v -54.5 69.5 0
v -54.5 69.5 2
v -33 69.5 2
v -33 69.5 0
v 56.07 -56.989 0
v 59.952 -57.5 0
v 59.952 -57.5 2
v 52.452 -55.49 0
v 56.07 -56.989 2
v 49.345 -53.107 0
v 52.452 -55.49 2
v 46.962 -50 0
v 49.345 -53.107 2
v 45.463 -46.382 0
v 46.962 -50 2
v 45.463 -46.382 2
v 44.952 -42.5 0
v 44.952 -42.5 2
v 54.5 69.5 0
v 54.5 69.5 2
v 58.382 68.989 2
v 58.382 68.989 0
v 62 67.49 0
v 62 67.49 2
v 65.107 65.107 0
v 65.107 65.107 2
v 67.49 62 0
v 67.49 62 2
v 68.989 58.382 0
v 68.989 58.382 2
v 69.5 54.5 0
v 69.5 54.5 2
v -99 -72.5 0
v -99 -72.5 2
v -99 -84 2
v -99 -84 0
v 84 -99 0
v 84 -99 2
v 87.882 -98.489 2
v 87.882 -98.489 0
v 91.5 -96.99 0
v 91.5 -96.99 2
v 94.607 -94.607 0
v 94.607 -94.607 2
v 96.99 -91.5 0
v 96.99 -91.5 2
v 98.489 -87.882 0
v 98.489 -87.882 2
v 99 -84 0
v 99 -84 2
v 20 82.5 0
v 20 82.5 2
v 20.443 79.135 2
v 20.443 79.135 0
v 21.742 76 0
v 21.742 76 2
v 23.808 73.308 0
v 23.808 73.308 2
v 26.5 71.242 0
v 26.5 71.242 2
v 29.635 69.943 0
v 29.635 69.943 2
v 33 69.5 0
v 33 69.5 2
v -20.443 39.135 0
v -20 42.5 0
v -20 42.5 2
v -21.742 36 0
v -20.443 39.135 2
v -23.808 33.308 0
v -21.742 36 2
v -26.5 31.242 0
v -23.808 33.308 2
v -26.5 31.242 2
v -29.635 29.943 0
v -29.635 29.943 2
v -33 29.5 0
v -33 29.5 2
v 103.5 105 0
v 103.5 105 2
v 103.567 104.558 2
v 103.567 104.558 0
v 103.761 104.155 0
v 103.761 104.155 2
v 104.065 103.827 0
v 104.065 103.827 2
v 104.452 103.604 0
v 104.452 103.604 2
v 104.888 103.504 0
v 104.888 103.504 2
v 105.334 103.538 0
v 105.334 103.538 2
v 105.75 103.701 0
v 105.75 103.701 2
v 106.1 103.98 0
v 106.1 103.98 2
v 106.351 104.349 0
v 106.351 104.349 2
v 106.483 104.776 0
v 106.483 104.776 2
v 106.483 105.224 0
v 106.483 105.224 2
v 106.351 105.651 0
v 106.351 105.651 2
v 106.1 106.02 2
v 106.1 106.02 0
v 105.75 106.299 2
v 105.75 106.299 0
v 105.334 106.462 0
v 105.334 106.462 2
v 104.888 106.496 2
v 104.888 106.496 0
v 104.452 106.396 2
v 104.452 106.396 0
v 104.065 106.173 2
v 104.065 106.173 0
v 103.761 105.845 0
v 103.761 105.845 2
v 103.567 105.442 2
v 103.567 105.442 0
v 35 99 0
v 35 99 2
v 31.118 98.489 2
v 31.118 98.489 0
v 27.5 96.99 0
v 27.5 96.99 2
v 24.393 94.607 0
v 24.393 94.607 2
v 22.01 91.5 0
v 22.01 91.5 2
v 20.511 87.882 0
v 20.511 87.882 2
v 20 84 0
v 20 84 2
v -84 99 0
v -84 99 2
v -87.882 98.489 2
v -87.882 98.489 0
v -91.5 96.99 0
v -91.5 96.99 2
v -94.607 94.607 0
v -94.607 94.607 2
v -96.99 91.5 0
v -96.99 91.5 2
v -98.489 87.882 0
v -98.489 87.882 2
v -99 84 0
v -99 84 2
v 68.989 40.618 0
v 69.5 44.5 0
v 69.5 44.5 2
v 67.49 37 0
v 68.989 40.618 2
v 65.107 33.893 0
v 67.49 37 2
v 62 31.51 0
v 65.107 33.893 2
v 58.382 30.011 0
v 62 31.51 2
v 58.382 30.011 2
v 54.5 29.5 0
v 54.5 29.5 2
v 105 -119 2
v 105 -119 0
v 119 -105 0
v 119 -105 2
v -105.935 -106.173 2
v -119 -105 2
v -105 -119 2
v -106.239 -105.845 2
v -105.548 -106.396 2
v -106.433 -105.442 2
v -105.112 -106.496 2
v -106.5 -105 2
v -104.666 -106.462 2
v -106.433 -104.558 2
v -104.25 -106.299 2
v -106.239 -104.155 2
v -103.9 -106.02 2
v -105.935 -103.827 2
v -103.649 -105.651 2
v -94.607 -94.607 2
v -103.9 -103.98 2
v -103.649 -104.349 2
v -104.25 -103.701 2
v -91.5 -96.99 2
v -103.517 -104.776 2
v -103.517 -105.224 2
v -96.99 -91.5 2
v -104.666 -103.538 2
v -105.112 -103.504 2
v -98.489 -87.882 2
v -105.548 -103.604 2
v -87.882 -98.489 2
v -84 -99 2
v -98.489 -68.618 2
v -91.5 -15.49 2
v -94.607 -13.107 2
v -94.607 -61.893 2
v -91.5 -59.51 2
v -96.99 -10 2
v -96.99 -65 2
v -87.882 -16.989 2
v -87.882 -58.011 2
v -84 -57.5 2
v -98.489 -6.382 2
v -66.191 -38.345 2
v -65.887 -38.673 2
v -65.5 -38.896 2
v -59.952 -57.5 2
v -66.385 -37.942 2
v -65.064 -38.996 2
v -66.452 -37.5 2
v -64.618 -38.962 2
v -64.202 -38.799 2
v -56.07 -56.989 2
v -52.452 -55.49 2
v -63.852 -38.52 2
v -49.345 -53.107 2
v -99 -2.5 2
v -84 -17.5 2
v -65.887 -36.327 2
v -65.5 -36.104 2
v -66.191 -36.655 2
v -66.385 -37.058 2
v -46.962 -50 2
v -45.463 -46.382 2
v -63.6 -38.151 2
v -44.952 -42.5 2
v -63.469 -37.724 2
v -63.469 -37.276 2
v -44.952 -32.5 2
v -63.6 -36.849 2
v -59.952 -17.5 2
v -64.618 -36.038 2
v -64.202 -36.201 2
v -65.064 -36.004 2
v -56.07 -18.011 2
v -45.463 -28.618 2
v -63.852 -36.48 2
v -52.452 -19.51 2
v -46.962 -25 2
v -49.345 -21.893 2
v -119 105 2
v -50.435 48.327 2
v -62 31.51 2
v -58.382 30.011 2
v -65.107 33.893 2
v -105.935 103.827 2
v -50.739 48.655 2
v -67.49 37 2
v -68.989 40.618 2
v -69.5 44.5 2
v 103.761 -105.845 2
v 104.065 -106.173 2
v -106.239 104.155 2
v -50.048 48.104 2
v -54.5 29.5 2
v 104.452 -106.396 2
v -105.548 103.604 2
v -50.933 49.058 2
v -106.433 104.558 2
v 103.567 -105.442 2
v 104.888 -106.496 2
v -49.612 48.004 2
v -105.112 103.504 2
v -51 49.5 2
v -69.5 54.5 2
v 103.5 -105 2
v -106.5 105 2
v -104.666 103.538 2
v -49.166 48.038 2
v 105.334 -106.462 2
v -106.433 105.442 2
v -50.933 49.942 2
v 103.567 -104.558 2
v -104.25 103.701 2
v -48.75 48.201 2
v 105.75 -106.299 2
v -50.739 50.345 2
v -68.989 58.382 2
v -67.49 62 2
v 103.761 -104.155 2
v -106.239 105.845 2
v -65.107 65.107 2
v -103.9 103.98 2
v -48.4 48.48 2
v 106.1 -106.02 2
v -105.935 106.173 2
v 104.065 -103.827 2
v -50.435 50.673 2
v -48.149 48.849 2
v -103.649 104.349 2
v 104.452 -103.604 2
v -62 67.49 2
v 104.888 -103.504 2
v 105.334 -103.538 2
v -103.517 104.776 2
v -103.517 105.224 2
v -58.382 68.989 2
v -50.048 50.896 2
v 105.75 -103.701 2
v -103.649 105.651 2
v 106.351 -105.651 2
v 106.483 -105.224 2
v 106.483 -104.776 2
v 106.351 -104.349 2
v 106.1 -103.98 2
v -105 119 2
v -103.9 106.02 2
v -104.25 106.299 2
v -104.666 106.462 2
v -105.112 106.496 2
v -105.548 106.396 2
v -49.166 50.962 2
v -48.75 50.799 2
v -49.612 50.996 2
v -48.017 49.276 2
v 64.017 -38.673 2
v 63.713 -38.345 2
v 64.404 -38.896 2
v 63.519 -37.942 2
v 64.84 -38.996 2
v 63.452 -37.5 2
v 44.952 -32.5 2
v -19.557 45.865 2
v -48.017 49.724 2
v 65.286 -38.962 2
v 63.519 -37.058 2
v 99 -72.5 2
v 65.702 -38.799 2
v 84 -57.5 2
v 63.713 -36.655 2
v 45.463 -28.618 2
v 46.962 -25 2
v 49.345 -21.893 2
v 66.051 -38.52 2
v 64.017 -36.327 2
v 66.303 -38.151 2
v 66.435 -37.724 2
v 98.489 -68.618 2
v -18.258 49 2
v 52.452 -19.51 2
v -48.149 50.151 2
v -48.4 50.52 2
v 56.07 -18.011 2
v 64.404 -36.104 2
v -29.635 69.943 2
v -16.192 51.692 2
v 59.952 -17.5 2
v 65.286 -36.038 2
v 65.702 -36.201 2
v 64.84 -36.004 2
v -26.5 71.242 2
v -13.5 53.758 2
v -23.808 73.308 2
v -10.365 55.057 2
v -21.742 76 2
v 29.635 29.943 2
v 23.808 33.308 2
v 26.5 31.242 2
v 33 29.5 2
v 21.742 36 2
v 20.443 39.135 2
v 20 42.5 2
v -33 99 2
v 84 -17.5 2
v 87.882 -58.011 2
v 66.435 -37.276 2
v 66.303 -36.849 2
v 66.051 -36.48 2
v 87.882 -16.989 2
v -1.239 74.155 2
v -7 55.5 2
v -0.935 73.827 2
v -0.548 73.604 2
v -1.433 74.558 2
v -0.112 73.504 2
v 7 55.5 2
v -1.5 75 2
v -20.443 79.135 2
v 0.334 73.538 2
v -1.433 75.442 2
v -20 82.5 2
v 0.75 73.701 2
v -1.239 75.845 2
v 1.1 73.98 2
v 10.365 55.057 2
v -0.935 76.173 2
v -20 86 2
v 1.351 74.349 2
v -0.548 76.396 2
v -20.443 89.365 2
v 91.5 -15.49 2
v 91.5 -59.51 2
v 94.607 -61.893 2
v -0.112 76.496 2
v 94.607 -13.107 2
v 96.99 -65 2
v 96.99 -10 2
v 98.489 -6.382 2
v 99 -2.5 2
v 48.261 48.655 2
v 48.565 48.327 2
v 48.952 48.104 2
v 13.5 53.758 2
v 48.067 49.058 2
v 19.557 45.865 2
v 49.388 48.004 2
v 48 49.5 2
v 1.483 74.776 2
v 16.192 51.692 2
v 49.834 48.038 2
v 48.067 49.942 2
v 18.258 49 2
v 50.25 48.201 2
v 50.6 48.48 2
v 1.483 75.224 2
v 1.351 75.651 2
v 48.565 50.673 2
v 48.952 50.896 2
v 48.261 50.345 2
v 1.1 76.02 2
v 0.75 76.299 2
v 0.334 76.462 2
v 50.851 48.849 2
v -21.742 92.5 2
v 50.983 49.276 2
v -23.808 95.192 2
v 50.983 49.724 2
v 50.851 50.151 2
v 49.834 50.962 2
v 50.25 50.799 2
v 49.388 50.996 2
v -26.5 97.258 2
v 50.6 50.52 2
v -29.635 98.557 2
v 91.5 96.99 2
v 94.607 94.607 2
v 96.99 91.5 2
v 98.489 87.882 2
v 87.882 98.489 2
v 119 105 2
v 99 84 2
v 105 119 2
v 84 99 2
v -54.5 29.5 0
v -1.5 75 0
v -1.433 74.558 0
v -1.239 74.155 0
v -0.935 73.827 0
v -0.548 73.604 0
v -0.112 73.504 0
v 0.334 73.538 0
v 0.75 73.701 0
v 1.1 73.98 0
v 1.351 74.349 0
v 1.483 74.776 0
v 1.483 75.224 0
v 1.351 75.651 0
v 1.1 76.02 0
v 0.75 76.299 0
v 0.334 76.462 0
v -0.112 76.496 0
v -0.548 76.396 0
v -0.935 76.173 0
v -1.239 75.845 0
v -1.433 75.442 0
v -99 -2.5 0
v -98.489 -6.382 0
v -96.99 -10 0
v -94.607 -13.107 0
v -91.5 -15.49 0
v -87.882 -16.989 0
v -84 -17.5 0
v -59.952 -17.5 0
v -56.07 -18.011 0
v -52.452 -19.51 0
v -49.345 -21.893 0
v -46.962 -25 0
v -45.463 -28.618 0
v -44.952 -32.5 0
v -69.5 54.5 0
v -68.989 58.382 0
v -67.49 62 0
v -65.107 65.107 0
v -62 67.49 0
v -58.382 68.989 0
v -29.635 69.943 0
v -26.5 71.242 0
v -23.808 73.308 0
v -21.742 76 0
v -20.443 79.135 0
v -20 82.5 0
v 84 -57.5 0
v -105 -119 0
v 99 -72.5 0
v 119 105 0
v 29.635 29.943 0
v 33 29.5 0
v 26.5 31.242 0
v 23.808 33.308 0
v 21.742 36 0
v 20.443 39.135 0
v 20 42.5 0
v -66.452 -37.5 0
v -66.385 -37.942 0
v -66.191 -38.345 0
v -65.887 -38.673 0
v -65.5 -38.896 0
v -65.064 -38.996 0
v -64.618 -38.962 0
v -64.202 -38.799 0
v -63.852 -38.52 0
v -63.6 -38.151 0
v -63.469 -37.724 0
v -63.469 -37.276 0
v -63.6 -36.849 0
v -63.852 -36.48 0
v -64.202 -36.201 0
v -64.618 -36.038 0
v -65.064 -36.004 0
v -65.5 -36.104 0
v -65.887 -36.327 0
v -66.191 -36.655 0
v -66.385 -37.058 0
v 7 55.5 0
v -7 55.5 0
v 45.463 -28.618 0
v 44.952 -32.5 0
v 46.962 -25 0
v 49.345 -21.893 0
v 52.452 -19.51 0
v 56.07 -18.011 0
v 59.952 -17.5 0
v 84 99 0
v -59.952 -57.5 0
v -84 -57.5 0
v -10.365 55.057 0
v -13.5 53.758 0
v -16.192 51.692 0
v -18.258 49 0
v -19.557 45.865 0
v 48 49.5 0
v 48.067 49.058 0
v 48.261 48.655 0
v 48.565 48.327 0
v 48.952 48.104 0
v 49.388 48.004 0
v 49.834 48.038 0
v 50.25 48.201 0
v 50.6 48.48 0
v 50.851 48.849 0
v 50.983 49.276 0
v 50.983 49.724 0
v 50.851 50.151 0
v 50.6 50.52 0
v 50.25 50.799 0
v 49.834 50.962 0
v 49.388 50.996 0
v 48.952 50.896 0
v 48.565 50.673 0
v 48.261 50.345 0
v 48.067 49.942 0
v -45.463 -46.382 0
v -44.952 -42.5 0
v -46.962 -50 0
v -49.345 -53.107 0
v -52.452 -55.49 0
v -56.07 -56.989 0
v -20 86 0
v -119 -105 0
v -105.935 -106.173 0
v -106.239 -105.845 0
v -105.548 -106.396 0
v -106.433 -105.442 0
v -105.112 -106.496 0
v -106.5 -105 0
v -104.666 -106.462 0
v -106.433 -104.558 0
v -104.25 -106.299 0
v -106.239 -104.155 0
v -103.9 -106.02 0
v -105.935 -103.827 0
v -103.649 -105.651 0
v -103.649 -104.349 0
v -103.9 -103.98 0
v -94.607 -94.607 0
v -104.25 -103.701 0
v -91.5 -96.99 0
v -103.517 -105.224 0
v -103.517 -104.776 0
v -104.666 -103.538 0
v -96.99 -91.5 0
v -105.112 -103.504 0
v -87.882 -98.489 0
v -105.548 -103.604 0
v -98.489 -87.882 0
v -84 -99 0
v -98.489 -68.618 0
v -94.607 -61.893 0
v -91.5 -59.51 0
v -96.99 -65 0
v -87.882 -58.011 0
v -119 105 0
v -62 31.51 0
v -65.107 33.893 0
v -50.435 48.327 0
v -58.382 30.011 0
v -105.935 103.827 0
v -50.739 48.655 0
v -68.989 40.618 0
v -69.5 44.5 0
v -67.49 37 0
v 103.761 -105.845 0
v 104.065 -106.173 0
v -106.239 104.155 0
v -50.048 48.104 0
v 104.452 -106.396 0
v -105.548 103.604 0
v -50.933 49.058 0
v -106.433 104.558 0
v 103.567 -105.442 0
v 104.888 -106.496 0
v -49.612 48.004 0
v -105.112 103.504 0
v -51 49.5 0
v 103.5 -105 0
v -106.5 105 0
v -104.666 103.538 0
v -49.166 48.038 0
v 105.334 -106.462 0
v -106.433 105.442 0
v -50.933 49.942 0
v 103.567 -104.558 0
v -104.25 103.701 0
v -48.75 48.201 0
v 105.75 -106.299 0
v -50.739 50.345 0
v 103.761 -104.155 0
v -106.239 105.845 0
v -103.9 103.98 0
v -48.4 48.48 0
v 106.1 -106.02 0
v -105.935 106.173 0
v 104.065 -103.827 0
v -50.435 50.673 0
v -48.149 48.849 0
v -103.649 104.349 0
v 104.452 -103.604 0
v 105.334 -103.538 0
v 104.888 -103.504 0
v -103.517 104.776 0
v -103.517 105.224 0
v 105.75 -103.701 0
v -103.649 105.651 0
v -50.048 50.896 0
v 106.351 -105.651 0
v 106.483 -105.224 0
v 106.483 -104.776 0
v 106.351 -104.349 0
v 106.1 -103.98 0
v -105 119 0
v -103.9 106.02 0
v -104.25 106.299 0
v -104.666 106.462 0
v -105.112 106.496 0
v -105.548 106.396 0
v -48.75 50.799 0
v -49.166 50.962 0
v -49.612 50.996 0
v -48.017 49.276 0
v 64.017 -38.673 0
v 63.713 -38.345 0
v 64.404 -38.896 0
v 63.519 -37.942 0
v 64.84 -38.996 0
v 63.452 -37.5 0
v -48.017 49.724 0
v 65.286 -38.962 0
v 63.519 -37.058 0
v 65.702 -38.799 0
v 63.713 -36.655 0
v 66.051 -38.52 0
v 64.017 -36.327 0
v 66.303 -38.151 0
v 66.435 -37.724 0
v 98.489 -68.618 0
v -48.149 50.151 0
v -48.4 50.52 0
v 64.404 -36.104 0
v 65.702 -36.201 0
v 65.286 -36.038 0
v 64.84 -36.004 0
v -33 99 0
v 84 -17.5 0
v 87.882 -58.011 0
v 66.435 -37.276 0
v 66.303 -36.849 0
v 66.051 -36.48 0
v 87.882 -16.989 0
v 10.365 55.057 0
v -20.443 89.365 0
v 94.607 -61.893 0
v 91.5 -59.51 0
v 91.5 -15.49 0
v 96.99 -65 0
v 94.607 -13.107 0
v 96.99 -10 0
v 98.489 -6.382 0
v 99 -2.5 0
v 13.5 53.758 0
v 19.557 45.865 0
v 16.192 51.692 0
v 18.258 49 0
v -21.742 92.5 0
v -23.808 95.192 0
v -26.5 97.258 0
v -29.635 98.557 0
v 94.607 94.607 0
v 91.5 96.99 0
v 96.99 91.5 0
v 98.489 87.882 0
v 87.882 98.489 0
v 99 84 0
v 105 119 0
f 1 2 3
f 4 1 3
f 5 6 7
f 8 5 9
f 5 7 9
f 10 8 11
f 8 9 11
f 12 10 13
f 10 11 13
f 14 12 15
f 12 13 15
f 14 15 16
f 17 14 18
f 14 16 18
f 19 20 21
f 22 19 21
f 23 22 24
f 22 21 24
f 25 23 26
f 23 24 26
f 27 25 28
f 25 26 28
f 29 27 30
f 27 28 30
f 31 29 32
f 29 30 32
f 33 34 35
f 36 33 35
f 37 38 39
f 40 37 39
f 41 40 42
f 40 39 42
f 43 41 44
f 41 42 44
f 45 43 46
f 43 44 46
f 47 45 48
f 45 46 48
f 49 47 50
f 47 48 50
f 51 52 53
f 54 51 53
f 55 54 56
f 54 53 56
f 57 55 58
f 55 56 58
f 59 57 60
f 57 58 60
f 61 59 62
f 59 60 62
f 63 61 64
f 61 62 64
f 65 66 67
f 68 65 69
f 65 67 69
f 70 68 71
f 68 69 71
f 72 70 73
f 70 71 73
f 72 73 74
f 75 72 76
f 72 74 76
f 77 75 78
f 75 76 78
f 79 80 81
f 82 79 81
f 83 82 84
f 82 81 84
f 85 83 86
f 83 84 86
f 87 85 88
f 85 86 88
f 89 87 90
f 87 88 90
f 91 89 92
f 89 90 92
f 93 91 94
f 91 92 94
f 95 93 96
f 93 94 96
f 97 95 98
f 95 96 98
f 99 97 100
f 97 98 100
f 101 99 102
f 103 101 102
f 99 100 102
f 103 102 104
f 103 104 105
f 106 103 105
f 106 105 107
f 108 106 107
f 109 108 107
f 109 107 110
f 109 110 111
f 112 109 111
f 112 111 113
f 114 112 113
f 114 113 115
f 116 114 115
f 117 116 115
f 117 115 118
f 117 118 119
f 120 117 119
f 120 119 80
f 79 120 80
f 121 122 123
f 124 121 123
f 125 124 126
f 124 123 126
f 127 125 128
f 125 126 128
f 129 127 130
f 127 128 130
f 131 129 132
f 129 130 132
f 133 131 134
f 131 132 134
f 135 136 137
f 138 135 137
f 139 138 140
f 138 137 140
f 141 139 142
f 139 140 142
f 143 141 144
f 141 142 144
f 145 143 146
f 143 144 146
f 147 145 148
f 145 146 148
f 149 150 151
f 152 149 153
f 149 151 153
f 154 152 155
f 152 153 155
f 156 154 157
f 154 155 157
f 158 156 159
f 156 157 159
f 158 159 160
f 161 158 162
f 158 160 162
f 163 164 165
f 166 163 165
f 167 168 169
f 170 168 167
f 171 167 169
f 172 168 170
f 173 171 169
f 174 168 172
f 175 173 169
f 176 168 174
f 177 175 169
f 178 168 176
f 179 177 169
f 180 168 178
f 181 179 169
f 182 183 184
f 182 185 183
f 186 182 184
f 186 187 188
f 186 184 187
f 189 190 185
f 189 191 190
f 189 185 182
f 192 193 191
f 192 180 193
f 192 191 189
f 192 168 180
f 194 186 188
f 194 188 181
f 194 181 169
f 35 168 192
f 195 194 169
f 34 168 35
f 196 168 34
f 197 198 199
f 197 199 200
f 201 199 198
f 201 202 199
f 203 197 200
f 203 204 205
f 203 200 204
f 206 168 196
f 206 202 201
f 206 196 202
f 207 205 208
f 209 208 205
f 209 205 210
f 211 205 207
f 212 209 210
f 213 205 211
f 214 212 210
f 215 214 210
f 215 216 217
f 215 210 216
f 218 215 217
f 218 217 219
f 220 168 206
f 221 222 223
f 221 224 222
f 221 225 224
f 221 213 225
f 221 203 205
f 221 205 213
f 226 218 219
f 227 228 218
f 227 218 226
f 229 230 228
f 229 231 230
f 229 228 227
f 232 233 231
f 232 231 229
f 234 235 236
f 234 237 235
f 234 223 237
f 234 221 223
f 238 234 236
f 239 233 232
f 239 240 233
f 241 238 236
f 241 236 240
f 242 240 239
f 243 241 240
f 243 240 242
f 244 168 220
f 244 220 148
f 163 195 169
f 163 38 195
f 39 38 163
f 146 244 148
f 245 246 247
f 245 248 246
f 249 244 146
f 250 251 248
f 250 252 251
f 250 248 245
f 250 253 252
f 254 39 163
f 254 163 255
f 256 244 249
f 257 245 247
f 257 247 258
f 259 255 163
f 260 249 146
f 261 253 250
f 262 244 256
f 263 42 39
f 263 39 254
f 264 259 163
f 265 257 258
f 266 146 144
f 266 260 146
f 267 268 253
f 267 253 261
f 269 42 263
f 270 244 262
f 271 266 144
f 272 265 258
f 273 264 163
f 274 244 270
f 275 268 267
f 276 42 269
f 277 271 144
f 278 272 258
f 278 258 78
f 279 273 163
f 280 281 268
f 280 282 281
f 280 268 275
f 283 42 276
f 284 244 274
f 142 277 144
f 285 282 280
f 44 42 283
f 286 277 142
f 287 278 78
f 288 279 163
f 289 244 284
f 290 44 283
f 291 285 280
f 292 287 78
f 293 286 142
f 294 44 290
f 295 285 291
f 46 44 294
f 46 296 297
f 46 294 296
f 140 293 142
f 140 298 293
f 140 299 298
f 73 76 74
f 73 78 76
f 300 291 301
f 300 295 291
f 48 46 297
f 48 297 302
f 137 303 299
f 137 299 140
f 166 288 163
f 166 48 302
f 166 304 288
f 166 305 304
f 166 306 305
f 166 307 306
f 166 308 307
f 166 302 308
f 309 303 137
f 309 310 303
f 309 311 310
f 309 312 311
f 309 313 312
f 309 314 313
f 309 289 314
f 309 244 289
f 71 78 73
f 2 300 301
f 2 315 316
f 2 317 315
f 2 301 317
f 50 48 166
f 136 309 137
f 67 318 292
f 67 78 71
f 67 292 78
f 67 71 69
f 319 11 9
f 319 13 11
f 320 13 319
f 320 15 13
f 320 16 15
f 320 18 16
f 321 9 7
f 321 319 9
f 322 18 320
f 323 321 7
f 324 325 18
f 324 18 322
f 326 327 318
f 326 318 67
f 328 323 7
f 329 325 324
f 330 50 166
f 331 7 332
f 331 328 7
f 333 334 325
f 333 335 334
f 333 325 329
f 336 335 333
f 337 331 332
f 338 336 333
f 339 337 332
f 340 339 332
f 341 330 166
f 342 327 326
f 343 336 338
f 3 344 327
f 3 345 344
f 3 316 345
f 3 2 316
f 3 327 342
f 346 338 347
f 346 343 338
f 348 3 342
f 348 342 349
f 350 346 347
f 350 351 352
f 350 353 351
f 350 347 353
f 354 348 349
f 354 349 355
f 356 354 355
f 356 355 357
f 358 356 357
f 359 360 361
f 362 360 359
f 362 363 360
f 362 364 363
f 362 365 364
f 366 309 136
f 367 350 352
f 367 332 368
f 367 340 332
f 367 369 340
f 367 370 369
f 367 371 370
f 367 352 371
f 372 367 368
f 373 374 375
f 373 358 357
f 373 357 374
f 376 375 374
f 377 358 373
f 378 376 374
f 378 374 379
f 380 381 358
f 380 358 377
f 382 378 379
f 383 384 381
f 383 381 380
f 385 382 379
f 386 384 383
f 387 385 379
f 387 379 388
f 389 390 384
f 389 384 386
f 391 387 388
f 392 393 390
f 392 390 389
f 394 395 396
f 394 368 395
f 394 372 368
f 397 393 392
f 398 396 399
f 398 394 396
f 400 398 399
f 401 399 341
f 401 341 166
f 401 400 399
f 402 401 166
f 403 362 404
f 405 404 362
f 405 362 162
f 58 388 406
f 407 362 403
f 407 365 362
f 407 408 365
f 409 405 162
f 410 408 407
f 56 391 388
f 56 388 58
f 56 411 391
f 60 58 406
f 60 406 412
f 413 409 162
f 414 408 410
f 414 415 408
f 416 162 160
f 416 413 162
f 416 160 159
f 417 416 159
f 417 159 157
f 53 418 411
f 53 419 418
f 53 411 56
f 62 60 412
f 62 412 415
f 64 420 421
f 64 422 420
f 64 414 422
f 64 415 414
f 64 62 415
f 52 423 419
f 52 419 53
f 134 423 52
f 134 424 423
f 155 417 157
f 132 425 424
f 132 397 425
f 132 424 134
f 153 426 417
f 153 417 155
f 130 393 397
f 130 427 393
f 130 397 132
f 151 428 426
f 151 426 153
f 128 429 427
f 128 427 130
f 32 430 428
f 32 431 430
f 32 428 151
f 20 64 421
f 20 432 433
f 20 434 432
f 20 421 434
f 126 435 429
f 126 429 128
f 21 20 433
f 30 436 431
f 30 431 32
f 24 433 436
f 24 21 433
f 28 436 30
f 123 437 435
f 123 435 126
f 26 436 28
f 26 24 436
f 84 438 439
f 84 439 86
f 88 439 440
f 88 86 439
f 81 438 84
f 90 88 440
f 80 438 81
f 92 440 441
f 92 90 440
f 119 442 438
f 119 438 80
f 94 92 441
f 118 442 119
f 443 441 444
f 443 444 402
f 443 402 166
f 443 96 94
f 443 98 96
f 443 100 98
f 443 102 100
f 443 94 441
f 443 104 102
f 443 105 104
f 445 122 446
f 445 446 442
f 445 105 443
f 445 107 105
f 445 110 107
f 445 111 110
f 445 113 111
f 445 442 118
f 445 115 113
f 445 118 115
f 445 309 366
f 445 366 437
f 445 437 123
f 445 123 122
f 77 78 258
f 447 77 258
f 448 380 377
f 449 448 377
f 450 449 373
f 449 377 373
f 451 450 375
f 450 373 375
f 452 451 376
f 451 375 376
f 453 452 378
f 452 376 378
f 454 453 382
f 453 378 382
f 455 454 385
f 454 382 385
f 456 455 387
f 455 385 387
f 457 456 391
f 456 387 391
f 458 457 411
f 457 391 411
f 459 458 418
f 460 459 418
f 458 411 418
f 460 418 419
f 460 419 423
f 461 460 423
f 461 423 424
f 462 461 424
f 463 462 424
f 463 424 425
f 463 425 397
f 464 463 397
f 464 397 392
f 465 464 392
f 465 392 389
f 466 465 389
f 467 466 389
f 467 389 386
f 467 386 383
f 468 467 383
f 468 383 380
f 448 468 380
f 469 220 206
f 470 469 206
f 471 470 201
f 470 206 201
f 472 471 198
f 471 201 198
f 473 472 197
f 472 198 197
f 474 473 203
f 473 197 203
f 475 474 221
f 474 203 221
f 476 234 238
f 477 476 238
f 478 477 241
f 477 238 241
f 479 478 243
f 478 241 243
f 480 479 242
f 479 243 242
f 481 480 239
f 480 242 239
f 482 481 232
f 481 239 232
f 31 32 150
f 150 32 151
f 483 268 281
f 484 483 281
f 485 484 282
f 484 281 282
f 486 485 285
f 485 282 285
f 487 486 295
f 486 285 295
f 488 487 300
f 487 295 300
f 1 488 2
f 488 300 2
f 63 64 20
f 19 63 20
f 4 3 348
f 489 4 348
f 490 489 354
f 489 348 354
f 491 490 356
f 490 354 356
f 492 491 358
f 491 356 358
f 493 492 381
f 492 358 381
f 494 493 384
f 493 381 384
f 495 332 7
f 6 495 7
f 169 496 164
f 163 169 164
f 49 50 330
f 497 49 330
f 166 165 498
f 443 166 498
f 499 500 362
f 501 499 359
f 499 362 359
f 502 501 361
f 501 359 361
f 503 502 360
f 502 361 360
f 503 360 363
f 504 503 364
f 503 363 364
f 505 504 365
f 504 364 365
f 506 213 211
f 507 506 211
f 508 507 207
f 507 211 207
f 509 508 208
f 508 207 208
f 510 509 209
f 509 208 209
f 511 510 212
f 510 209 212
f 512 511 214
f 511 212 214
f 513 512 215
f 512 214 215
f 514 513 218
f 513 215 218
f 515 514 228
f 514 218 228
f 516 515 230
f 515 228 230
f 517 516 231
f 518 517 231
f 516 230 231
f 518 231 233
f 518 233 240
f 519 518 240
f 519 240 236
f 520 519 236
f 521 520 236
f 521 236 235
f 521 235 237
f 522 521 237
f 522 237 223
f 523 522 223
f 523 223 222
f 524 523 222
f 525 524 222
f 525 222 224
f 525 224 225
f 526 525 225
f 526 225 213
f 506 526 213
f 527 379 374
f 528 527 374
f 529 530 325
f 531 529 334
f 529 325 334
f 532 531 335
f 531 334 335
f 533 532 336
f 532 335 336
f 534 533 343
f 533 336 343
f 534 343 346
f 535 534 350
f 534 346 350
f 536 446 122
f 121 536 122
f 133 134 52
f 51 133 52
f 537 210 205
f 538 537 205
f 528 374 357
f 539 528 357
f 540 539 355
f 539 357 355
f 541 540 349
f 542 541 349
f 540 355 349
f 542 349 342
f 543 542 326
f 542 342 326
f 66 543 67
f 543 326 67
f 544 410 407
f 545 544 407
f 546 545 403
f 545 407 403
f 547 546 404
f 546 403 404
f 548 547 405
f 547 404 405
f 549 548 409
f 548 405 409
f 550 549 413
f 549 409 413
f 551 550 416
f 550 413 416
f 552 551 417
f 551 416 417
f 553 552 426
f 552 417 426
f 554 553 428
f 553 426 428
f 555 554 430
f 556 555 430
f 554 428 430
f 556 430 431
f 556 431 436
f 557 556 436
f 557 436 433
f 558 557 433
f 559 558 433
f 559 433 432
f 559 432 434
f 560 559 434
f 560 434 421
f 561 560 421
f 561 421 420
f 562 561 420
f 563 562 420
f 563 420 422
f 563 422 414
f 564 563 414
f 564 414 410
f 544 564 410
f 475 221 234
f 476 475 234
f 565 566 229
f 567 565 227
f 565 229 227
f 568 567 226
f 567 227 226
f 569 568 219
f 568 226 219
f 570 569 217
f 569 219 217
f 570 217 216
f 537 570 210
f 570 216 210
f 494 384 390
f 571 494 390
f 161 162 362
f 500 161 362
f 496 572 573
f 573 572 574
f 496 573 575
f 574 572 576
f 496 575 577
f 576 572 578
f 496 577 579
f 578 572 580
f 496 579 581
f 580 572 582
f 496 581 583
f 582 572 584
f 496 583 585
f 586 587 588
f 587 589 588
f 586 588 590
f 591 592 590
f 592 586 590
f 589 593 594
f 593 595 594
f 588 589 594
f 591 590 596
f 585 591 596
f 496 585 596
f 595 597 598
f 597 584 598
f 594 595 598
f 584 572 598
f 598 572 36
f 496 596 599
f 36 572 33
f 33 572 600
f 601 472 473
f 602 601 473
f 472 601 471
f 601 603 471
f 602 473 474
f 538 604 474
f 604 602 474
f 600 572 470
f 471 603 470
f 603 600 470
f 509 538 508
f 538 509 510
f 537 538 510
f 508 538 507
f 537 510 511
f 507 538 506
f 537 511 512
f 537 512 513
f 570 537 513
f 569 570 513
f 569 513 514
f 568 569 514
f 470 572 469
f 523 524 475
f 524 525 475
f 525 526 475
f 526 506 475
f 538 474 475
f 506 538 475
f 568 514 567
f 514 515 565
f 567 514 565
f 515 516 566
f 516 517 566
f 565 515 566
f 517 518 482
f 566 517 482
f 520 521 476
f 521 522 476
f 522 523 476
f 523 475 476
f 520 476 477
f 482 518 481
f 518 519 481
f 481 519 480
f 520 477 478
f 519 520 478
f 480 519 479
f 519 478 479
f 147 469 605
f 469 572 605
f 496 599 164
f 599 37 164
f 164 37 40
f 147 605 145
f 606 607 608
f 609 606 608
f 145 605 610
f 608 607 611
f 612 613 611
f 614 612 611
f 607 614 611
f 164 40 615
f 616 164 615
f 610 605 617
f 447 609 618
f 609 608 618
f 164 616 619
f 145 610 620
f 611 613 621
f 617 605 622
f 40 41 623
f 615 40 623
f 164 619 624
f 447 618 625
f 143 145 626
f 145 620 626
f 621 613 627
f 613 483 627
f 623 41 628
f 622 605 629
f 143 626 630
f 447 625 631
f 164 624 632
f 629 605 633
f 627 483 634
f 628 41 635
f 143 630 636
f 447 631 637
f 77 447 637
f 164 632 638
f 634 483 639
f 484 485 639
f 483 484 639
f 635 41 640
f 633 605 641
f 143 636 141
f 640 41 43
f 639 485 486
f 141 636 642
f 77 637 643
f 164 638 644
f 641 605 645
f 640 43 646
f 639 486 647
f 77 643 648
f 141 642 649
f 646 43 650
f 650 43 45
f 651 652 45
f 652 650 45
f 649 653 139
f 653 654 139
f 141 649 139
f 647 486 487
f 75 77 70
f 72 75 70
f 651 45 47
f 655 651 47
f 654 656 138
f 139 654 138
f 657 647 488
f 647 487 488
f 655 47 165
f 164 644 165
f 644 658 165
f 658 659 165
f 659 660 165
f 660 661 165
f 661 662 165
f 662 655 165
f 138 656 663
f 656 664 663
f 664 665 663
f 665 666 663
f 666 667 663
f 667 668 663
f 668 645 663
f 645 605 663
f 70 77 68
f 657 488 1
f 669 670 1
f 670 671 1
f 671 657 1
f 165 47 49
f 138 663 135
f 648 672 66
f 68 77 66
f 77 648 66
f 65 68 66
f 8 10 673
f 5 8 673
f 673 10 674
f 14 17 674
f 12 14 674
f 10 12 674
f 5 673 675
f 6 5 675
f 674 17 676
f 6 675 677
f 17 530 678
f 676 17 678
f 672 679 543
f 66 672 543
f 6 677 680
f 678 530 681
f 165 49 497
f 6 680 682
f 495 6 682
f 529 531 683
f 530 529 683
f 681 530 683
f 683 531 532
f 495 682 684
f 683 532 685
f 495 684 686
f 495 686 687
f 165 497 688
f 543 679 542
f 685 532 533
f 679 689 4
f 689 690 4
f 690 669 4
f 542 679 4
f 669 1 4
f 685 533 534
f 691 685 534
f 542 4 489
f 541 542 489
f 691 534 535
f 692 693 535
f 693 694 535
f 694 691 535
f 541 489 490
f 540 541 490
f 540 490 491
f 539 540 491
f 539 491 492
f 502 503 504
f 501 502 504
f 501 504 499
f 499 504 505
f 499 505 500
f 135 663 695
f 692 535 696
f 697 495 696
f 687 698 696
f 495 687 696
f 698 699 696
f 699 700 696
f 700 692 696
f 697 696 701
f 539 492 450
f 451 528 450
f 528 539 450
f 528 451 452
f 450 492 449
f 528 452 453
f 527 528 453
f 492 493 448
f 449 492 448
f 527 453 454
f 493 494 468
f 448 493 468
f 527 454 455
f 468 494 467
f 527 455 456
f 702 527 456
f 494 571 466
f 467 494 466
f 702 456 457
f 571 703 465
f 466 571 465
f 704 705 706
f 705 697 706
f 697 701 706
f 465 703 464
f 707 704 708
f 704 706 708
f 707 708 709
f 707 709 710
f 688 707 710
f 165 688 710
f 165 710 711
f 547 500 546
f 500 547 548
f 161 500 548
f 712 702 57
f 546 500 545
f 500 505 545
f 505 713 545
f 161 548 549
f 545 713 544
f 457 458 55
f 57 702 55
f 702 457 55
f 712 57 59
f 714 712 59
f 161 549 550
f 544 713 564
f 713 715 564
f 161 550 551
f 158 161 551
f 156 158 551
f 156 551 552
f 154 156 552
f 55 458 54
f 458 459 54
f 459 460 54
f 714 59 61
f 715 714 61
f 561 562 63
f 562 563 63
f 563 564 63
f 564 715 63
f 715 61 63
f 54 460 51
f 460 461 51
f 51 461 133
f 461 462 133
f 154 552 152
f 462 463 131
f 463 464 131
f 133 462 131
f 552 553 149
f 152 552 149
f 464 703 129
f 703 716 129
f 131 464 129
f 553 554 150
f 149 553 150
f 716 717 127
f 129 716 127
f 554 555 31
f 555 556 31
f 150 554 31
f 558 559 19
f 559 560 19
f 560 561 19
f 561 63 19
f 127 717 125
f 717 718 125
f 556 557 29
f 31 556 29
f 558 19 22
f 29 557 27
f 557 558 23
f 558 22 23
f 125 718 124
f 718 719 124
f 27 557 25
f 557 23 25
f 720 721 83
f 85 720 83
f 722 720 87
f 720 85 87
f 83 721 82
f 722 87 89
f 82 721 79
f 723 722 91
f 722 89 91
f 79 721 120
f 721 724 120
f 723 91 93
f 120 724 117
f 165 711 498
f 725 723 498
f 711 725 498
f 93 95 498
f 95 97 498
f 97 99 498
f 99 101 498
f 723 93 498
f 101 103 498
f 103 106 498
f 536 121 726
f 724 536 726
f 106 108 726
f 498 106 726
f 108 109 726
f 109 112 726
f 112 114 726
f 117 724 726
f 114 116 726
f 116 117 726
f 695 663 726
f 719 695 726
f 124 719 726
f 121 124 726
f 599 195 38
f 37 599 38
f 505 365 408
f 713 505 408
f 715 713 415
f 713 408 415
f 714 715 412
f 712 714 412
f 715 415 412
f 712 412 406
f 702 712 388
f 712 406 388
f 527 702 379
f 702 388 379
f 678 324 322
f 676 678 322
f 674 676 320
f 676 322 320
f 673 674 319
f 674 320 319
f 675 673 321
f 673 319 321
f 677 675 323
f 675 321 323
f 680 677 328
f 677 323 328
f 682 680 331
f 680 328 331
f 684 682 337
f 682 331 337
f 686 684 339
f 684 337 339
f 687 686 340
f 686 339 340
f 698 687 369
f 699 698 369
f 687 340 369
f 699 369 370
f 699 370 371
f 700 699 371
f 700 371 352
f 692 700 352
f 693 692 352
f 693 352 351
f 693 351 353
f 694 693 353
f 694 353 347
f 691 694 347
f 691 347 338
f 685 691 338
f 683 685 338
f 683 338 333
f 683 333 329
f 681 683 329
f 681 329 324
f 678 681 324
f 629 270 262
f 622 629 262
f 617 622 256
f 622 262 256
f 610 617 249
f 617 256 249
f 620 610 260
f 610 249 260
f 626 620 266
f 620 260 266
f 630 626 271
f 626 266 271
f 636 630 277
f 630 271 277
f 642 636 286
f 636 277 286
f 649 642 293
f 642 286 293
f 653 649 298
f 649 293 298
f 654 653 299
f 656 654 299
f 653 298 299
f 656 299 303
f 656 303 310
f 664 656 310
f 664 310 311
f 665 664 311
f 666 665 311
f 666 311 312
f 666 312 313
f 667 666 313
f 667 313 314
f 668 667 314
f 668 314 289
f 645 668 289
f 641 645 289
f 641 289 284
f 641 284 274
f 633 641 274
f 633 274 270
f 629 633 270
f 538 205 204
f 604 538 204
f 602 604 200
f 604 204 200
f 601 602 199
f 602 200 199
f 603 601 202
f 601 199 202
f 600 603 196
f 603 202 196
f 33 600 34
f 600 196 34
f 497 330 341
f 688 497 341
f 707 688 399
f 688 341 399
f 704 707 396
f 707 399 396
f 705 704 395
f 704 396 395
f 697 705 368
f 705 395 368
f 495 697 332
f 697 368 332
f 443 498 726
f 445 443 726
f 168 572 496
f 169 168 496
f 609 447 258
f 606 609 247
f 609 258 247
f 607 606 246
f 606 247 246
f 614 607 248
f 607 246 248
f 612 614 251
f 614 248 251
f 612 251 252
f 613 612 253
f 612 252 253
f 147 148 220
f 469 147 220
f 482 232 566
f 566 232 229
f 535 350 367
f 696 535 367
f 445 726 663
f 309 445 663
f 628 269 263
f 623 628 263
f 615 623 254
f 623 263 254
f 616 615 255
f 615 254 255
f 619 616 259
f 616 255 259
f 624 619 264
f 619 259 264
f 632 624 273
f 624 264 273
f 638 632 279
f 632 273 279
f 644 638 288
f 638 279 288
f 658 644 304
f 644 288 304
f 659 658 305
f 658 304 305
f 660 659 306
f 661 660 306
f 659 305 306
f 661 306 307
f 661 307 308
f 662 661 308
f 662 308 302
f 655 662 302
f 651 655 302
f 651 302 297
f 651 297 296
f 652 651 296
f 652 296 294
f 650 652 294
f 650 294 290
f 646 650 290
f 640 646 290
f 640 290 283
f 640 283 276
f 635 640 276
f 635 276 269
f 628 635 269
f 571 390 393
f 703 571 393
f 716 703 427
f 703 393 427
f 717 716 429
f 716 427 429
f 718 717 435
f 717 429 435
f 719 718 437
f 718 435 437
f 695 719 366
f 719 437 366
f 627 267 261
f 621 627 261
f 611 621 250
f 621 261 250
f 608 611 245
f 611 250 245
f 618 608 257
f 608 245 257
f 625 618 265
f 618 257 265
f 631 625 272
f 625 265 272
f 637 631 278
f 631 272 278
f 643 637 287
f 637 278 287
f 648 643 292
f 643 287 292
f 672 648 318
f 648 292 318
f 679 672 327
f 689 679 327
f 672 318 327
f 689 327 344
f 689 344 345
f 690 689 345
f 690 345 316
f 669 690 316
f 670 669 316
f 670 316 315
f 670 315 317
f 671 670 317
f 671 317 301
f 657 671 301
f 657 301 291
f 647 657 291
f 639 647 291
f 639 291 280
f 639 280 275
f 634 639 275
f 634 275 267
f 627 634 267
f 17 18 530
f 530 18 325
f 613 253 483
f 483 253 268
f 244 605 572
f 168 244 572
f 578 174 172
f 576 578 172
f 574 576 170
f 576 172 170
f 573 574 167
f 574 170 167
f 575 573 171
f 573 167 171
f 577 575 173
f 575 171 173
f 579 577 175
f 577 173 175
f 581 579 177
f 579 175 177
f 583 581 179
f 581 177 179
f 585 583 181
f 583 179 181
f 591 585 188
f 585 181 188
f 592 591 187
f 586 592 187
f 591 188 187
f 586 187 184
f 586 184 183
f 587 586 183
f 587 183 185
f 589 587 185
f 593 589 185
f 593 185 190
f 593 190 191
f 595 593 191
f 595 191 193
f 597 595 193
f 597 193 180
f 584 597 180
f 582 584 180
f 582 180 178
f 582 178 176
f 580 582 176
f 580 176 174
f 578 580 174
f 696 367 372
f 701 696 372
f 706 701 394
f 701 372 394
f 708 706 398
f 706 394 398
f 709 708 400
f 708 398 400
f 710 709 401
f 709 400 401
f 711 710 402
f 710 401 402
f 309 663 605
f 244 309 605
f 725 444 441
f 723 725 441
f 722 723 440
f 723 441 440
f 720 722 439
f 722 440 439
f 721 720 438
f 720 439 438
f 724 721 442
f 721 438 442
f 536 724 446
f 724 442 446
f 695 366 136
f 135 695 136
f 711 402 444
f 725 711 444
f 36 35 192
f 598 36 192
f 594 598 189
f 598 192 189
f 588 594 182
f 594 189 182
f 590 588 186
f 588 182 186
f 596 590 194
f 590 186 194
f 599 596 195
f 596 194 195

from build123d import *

# Parameters (mm, degrees)
F1_DEPTH = 2
F2_D     = 3
F3_R     = 12.5
F4_DEPTH = 25


with BuildPart() as f1:
    # F0 (on Top) → F1 (new body)
    with BuildSketch(Plane.XY):
        Polygon((119, 105), (105, 119), (-105, 119), (-119, 105), (-119, -105), (-105, -119), (105, -119), (119, -105), align=None)
    extrude(amount=F1_DEPTH)

    # F2 (through all)
    with Locations(Plane(origin=(0, 0, 0), x_dir=(1, 0, 0), z_dir=(0, 0, -1))):
        with Locations((-105, -105), (105, -105), (-105, 105), (105, 105), (0, -75), (64.9519052838, 37.5), (-64.9519052838, 37.5), (-49.5, -49.5), (49.5, -49.5)):
            Hole(F2_D / 2)

    # F3 (on face) → F4 (cut)
    with BuildSketch(Plane.XY.offset(2)):
        with BuildLine():
            Line((-99, 84), (-99, -2.5))
            ThreePointArc((-99, -2.5), (-94.6066017178, -13.1066017178), (-84, -17.5))
            Line((-84, -17.5), (-59.9519052838, -17.5))
            ThreePointArc((-59.9519052838, -17.5), (-49.345303566, -21.8933982822), (-44.9519052838, -32.5))
            Line((-44.9519052838, -32.5), (-44.9519052838, -42.5))
            ThreePointArc((-44.9519052838, -42.5), (-49.345303566, -53.1066017178), (-59.9519052838, -57.5))
            Line((-59.9519052838, -57.5), (-84, -57.5))
            ThreePointArc((-84, -57.5), (-94.6066017178, -61.8933982822), (-99, -72.5))
            Line((-99, -72.5), (-99, -84))
            ThreePointArc((-99, -84), (-94.6066017178, -94.6066017178), (-84, -99))
            Line((-84, -99), (84, -99))
            ThreePointArc((84, -99), (94.6066017178, -94.6066017178), (99, -84))
            Line((99, -84), (99, -72.5))
            ThreePointArc((99, -72.5), (94.6066017178, -61.8933982822), (84, -57.5))
            Line((84, -57.5), (59.9519052838, -57.5))
            ThreePointArc((59.9519052838, -57.5), (49.345303566, -53.1066017178), (44.9519052838, -42.5))
            Line((44.9519052838, -42.5), (44.9519052838, -37.5))
            Line((44.9519052838, -37.5), (44.9519052838, -32.5))
            ThreePointArc((44.9519052838, -32.5), (49.345303566, -21.8933982822), (59.9519052838, -17.5))
            Line((59.9519052838, -17.5), (84, -17.5))
            ThreePointArc((84, -17.5), (94.6066017178, -13.1066017178), (99, -2.5))
            Line((99, -2.5), (99, 40.75))
            Line((99, 40.75), (99, 84))
            ThreePointArc((99, 84), (94.6066017178, 94.6066017178), (84, 99))
            Line((84, 99), (35, 99))
            ThreePointArc((35, 99), (24.3933982822, 94.6066017178), (20, 84))
            Line((20, 84), (20, 82.5))
            ThreePointArc((20, 82.5), (23.8076118446, 73.3076118446), (33, 69.5))
            Line((33, 69.5), (54.5, 69.5))
            ThreePointArc((54.5, 69.5), (65.1066017178, 65.1066017178), (69.5, 54.5))
            Line((69.5, 54.5), (69.5, 44.5))
            ThreePointArc((69.5, 44.5), (65.1066017178, 33.8933982822), (54.5, 29.5))
            Line((54.5, 29.5), (33, 29.5))
            ThreePointArc((33, 29.5), (23.8076118446, 33.3076118446), (20, 42.5))
            ThreePointArc((20, 42.5), (16.1923881554, 51.6923881554), (7, 55.5))
            Line((7, 55.5), (-7, 55.5))
            ThreePointArc((-7, 55.5), (-16.1923881554, 51.6923881554), (-20, 42.5))
            ThreePointArc((-20, 42.5), (-23.8076118446, 33.3076118446), (-33, 29.5))
            Line((-33, 29.5), (-54.5, 29.5))
            ThreePointArc((-54.5, 29.5), (-65.1066017178, 33.8933982822), (-69.5, 44.5))
            Line((-69.5, 44.5), (-69.5, 54.5))
            ThreePointArc((-69.5, 54.5), (-65.1066017178, 65.1066017178), (-54.5, 69.5))
            Line((-54.5, 69.5), (-33, 69.5))
            ThreePointArc((-33, 69.5), (-23.8076118446, 73.3076118446), (-20, 82.5))
            Line((-20, 82.5), (-20, 86))
            ThreePointArc((-20, 86), (-23.8076118446, 95.1923881554), (-33, 99))
            Line((-33, 99), (-84, 99))
            ThreePointArc((-84, 99), (-94.6066017178, 94.6066017178), (-99, 84))
        make_face()
        Circle(F3_R, mode=Mode.SUBTRACT)
        Circle(F3_R)
    extrude(amount=-F4_DEPTH, mode=Mode.SUBTRACT)


solid = f1.part
